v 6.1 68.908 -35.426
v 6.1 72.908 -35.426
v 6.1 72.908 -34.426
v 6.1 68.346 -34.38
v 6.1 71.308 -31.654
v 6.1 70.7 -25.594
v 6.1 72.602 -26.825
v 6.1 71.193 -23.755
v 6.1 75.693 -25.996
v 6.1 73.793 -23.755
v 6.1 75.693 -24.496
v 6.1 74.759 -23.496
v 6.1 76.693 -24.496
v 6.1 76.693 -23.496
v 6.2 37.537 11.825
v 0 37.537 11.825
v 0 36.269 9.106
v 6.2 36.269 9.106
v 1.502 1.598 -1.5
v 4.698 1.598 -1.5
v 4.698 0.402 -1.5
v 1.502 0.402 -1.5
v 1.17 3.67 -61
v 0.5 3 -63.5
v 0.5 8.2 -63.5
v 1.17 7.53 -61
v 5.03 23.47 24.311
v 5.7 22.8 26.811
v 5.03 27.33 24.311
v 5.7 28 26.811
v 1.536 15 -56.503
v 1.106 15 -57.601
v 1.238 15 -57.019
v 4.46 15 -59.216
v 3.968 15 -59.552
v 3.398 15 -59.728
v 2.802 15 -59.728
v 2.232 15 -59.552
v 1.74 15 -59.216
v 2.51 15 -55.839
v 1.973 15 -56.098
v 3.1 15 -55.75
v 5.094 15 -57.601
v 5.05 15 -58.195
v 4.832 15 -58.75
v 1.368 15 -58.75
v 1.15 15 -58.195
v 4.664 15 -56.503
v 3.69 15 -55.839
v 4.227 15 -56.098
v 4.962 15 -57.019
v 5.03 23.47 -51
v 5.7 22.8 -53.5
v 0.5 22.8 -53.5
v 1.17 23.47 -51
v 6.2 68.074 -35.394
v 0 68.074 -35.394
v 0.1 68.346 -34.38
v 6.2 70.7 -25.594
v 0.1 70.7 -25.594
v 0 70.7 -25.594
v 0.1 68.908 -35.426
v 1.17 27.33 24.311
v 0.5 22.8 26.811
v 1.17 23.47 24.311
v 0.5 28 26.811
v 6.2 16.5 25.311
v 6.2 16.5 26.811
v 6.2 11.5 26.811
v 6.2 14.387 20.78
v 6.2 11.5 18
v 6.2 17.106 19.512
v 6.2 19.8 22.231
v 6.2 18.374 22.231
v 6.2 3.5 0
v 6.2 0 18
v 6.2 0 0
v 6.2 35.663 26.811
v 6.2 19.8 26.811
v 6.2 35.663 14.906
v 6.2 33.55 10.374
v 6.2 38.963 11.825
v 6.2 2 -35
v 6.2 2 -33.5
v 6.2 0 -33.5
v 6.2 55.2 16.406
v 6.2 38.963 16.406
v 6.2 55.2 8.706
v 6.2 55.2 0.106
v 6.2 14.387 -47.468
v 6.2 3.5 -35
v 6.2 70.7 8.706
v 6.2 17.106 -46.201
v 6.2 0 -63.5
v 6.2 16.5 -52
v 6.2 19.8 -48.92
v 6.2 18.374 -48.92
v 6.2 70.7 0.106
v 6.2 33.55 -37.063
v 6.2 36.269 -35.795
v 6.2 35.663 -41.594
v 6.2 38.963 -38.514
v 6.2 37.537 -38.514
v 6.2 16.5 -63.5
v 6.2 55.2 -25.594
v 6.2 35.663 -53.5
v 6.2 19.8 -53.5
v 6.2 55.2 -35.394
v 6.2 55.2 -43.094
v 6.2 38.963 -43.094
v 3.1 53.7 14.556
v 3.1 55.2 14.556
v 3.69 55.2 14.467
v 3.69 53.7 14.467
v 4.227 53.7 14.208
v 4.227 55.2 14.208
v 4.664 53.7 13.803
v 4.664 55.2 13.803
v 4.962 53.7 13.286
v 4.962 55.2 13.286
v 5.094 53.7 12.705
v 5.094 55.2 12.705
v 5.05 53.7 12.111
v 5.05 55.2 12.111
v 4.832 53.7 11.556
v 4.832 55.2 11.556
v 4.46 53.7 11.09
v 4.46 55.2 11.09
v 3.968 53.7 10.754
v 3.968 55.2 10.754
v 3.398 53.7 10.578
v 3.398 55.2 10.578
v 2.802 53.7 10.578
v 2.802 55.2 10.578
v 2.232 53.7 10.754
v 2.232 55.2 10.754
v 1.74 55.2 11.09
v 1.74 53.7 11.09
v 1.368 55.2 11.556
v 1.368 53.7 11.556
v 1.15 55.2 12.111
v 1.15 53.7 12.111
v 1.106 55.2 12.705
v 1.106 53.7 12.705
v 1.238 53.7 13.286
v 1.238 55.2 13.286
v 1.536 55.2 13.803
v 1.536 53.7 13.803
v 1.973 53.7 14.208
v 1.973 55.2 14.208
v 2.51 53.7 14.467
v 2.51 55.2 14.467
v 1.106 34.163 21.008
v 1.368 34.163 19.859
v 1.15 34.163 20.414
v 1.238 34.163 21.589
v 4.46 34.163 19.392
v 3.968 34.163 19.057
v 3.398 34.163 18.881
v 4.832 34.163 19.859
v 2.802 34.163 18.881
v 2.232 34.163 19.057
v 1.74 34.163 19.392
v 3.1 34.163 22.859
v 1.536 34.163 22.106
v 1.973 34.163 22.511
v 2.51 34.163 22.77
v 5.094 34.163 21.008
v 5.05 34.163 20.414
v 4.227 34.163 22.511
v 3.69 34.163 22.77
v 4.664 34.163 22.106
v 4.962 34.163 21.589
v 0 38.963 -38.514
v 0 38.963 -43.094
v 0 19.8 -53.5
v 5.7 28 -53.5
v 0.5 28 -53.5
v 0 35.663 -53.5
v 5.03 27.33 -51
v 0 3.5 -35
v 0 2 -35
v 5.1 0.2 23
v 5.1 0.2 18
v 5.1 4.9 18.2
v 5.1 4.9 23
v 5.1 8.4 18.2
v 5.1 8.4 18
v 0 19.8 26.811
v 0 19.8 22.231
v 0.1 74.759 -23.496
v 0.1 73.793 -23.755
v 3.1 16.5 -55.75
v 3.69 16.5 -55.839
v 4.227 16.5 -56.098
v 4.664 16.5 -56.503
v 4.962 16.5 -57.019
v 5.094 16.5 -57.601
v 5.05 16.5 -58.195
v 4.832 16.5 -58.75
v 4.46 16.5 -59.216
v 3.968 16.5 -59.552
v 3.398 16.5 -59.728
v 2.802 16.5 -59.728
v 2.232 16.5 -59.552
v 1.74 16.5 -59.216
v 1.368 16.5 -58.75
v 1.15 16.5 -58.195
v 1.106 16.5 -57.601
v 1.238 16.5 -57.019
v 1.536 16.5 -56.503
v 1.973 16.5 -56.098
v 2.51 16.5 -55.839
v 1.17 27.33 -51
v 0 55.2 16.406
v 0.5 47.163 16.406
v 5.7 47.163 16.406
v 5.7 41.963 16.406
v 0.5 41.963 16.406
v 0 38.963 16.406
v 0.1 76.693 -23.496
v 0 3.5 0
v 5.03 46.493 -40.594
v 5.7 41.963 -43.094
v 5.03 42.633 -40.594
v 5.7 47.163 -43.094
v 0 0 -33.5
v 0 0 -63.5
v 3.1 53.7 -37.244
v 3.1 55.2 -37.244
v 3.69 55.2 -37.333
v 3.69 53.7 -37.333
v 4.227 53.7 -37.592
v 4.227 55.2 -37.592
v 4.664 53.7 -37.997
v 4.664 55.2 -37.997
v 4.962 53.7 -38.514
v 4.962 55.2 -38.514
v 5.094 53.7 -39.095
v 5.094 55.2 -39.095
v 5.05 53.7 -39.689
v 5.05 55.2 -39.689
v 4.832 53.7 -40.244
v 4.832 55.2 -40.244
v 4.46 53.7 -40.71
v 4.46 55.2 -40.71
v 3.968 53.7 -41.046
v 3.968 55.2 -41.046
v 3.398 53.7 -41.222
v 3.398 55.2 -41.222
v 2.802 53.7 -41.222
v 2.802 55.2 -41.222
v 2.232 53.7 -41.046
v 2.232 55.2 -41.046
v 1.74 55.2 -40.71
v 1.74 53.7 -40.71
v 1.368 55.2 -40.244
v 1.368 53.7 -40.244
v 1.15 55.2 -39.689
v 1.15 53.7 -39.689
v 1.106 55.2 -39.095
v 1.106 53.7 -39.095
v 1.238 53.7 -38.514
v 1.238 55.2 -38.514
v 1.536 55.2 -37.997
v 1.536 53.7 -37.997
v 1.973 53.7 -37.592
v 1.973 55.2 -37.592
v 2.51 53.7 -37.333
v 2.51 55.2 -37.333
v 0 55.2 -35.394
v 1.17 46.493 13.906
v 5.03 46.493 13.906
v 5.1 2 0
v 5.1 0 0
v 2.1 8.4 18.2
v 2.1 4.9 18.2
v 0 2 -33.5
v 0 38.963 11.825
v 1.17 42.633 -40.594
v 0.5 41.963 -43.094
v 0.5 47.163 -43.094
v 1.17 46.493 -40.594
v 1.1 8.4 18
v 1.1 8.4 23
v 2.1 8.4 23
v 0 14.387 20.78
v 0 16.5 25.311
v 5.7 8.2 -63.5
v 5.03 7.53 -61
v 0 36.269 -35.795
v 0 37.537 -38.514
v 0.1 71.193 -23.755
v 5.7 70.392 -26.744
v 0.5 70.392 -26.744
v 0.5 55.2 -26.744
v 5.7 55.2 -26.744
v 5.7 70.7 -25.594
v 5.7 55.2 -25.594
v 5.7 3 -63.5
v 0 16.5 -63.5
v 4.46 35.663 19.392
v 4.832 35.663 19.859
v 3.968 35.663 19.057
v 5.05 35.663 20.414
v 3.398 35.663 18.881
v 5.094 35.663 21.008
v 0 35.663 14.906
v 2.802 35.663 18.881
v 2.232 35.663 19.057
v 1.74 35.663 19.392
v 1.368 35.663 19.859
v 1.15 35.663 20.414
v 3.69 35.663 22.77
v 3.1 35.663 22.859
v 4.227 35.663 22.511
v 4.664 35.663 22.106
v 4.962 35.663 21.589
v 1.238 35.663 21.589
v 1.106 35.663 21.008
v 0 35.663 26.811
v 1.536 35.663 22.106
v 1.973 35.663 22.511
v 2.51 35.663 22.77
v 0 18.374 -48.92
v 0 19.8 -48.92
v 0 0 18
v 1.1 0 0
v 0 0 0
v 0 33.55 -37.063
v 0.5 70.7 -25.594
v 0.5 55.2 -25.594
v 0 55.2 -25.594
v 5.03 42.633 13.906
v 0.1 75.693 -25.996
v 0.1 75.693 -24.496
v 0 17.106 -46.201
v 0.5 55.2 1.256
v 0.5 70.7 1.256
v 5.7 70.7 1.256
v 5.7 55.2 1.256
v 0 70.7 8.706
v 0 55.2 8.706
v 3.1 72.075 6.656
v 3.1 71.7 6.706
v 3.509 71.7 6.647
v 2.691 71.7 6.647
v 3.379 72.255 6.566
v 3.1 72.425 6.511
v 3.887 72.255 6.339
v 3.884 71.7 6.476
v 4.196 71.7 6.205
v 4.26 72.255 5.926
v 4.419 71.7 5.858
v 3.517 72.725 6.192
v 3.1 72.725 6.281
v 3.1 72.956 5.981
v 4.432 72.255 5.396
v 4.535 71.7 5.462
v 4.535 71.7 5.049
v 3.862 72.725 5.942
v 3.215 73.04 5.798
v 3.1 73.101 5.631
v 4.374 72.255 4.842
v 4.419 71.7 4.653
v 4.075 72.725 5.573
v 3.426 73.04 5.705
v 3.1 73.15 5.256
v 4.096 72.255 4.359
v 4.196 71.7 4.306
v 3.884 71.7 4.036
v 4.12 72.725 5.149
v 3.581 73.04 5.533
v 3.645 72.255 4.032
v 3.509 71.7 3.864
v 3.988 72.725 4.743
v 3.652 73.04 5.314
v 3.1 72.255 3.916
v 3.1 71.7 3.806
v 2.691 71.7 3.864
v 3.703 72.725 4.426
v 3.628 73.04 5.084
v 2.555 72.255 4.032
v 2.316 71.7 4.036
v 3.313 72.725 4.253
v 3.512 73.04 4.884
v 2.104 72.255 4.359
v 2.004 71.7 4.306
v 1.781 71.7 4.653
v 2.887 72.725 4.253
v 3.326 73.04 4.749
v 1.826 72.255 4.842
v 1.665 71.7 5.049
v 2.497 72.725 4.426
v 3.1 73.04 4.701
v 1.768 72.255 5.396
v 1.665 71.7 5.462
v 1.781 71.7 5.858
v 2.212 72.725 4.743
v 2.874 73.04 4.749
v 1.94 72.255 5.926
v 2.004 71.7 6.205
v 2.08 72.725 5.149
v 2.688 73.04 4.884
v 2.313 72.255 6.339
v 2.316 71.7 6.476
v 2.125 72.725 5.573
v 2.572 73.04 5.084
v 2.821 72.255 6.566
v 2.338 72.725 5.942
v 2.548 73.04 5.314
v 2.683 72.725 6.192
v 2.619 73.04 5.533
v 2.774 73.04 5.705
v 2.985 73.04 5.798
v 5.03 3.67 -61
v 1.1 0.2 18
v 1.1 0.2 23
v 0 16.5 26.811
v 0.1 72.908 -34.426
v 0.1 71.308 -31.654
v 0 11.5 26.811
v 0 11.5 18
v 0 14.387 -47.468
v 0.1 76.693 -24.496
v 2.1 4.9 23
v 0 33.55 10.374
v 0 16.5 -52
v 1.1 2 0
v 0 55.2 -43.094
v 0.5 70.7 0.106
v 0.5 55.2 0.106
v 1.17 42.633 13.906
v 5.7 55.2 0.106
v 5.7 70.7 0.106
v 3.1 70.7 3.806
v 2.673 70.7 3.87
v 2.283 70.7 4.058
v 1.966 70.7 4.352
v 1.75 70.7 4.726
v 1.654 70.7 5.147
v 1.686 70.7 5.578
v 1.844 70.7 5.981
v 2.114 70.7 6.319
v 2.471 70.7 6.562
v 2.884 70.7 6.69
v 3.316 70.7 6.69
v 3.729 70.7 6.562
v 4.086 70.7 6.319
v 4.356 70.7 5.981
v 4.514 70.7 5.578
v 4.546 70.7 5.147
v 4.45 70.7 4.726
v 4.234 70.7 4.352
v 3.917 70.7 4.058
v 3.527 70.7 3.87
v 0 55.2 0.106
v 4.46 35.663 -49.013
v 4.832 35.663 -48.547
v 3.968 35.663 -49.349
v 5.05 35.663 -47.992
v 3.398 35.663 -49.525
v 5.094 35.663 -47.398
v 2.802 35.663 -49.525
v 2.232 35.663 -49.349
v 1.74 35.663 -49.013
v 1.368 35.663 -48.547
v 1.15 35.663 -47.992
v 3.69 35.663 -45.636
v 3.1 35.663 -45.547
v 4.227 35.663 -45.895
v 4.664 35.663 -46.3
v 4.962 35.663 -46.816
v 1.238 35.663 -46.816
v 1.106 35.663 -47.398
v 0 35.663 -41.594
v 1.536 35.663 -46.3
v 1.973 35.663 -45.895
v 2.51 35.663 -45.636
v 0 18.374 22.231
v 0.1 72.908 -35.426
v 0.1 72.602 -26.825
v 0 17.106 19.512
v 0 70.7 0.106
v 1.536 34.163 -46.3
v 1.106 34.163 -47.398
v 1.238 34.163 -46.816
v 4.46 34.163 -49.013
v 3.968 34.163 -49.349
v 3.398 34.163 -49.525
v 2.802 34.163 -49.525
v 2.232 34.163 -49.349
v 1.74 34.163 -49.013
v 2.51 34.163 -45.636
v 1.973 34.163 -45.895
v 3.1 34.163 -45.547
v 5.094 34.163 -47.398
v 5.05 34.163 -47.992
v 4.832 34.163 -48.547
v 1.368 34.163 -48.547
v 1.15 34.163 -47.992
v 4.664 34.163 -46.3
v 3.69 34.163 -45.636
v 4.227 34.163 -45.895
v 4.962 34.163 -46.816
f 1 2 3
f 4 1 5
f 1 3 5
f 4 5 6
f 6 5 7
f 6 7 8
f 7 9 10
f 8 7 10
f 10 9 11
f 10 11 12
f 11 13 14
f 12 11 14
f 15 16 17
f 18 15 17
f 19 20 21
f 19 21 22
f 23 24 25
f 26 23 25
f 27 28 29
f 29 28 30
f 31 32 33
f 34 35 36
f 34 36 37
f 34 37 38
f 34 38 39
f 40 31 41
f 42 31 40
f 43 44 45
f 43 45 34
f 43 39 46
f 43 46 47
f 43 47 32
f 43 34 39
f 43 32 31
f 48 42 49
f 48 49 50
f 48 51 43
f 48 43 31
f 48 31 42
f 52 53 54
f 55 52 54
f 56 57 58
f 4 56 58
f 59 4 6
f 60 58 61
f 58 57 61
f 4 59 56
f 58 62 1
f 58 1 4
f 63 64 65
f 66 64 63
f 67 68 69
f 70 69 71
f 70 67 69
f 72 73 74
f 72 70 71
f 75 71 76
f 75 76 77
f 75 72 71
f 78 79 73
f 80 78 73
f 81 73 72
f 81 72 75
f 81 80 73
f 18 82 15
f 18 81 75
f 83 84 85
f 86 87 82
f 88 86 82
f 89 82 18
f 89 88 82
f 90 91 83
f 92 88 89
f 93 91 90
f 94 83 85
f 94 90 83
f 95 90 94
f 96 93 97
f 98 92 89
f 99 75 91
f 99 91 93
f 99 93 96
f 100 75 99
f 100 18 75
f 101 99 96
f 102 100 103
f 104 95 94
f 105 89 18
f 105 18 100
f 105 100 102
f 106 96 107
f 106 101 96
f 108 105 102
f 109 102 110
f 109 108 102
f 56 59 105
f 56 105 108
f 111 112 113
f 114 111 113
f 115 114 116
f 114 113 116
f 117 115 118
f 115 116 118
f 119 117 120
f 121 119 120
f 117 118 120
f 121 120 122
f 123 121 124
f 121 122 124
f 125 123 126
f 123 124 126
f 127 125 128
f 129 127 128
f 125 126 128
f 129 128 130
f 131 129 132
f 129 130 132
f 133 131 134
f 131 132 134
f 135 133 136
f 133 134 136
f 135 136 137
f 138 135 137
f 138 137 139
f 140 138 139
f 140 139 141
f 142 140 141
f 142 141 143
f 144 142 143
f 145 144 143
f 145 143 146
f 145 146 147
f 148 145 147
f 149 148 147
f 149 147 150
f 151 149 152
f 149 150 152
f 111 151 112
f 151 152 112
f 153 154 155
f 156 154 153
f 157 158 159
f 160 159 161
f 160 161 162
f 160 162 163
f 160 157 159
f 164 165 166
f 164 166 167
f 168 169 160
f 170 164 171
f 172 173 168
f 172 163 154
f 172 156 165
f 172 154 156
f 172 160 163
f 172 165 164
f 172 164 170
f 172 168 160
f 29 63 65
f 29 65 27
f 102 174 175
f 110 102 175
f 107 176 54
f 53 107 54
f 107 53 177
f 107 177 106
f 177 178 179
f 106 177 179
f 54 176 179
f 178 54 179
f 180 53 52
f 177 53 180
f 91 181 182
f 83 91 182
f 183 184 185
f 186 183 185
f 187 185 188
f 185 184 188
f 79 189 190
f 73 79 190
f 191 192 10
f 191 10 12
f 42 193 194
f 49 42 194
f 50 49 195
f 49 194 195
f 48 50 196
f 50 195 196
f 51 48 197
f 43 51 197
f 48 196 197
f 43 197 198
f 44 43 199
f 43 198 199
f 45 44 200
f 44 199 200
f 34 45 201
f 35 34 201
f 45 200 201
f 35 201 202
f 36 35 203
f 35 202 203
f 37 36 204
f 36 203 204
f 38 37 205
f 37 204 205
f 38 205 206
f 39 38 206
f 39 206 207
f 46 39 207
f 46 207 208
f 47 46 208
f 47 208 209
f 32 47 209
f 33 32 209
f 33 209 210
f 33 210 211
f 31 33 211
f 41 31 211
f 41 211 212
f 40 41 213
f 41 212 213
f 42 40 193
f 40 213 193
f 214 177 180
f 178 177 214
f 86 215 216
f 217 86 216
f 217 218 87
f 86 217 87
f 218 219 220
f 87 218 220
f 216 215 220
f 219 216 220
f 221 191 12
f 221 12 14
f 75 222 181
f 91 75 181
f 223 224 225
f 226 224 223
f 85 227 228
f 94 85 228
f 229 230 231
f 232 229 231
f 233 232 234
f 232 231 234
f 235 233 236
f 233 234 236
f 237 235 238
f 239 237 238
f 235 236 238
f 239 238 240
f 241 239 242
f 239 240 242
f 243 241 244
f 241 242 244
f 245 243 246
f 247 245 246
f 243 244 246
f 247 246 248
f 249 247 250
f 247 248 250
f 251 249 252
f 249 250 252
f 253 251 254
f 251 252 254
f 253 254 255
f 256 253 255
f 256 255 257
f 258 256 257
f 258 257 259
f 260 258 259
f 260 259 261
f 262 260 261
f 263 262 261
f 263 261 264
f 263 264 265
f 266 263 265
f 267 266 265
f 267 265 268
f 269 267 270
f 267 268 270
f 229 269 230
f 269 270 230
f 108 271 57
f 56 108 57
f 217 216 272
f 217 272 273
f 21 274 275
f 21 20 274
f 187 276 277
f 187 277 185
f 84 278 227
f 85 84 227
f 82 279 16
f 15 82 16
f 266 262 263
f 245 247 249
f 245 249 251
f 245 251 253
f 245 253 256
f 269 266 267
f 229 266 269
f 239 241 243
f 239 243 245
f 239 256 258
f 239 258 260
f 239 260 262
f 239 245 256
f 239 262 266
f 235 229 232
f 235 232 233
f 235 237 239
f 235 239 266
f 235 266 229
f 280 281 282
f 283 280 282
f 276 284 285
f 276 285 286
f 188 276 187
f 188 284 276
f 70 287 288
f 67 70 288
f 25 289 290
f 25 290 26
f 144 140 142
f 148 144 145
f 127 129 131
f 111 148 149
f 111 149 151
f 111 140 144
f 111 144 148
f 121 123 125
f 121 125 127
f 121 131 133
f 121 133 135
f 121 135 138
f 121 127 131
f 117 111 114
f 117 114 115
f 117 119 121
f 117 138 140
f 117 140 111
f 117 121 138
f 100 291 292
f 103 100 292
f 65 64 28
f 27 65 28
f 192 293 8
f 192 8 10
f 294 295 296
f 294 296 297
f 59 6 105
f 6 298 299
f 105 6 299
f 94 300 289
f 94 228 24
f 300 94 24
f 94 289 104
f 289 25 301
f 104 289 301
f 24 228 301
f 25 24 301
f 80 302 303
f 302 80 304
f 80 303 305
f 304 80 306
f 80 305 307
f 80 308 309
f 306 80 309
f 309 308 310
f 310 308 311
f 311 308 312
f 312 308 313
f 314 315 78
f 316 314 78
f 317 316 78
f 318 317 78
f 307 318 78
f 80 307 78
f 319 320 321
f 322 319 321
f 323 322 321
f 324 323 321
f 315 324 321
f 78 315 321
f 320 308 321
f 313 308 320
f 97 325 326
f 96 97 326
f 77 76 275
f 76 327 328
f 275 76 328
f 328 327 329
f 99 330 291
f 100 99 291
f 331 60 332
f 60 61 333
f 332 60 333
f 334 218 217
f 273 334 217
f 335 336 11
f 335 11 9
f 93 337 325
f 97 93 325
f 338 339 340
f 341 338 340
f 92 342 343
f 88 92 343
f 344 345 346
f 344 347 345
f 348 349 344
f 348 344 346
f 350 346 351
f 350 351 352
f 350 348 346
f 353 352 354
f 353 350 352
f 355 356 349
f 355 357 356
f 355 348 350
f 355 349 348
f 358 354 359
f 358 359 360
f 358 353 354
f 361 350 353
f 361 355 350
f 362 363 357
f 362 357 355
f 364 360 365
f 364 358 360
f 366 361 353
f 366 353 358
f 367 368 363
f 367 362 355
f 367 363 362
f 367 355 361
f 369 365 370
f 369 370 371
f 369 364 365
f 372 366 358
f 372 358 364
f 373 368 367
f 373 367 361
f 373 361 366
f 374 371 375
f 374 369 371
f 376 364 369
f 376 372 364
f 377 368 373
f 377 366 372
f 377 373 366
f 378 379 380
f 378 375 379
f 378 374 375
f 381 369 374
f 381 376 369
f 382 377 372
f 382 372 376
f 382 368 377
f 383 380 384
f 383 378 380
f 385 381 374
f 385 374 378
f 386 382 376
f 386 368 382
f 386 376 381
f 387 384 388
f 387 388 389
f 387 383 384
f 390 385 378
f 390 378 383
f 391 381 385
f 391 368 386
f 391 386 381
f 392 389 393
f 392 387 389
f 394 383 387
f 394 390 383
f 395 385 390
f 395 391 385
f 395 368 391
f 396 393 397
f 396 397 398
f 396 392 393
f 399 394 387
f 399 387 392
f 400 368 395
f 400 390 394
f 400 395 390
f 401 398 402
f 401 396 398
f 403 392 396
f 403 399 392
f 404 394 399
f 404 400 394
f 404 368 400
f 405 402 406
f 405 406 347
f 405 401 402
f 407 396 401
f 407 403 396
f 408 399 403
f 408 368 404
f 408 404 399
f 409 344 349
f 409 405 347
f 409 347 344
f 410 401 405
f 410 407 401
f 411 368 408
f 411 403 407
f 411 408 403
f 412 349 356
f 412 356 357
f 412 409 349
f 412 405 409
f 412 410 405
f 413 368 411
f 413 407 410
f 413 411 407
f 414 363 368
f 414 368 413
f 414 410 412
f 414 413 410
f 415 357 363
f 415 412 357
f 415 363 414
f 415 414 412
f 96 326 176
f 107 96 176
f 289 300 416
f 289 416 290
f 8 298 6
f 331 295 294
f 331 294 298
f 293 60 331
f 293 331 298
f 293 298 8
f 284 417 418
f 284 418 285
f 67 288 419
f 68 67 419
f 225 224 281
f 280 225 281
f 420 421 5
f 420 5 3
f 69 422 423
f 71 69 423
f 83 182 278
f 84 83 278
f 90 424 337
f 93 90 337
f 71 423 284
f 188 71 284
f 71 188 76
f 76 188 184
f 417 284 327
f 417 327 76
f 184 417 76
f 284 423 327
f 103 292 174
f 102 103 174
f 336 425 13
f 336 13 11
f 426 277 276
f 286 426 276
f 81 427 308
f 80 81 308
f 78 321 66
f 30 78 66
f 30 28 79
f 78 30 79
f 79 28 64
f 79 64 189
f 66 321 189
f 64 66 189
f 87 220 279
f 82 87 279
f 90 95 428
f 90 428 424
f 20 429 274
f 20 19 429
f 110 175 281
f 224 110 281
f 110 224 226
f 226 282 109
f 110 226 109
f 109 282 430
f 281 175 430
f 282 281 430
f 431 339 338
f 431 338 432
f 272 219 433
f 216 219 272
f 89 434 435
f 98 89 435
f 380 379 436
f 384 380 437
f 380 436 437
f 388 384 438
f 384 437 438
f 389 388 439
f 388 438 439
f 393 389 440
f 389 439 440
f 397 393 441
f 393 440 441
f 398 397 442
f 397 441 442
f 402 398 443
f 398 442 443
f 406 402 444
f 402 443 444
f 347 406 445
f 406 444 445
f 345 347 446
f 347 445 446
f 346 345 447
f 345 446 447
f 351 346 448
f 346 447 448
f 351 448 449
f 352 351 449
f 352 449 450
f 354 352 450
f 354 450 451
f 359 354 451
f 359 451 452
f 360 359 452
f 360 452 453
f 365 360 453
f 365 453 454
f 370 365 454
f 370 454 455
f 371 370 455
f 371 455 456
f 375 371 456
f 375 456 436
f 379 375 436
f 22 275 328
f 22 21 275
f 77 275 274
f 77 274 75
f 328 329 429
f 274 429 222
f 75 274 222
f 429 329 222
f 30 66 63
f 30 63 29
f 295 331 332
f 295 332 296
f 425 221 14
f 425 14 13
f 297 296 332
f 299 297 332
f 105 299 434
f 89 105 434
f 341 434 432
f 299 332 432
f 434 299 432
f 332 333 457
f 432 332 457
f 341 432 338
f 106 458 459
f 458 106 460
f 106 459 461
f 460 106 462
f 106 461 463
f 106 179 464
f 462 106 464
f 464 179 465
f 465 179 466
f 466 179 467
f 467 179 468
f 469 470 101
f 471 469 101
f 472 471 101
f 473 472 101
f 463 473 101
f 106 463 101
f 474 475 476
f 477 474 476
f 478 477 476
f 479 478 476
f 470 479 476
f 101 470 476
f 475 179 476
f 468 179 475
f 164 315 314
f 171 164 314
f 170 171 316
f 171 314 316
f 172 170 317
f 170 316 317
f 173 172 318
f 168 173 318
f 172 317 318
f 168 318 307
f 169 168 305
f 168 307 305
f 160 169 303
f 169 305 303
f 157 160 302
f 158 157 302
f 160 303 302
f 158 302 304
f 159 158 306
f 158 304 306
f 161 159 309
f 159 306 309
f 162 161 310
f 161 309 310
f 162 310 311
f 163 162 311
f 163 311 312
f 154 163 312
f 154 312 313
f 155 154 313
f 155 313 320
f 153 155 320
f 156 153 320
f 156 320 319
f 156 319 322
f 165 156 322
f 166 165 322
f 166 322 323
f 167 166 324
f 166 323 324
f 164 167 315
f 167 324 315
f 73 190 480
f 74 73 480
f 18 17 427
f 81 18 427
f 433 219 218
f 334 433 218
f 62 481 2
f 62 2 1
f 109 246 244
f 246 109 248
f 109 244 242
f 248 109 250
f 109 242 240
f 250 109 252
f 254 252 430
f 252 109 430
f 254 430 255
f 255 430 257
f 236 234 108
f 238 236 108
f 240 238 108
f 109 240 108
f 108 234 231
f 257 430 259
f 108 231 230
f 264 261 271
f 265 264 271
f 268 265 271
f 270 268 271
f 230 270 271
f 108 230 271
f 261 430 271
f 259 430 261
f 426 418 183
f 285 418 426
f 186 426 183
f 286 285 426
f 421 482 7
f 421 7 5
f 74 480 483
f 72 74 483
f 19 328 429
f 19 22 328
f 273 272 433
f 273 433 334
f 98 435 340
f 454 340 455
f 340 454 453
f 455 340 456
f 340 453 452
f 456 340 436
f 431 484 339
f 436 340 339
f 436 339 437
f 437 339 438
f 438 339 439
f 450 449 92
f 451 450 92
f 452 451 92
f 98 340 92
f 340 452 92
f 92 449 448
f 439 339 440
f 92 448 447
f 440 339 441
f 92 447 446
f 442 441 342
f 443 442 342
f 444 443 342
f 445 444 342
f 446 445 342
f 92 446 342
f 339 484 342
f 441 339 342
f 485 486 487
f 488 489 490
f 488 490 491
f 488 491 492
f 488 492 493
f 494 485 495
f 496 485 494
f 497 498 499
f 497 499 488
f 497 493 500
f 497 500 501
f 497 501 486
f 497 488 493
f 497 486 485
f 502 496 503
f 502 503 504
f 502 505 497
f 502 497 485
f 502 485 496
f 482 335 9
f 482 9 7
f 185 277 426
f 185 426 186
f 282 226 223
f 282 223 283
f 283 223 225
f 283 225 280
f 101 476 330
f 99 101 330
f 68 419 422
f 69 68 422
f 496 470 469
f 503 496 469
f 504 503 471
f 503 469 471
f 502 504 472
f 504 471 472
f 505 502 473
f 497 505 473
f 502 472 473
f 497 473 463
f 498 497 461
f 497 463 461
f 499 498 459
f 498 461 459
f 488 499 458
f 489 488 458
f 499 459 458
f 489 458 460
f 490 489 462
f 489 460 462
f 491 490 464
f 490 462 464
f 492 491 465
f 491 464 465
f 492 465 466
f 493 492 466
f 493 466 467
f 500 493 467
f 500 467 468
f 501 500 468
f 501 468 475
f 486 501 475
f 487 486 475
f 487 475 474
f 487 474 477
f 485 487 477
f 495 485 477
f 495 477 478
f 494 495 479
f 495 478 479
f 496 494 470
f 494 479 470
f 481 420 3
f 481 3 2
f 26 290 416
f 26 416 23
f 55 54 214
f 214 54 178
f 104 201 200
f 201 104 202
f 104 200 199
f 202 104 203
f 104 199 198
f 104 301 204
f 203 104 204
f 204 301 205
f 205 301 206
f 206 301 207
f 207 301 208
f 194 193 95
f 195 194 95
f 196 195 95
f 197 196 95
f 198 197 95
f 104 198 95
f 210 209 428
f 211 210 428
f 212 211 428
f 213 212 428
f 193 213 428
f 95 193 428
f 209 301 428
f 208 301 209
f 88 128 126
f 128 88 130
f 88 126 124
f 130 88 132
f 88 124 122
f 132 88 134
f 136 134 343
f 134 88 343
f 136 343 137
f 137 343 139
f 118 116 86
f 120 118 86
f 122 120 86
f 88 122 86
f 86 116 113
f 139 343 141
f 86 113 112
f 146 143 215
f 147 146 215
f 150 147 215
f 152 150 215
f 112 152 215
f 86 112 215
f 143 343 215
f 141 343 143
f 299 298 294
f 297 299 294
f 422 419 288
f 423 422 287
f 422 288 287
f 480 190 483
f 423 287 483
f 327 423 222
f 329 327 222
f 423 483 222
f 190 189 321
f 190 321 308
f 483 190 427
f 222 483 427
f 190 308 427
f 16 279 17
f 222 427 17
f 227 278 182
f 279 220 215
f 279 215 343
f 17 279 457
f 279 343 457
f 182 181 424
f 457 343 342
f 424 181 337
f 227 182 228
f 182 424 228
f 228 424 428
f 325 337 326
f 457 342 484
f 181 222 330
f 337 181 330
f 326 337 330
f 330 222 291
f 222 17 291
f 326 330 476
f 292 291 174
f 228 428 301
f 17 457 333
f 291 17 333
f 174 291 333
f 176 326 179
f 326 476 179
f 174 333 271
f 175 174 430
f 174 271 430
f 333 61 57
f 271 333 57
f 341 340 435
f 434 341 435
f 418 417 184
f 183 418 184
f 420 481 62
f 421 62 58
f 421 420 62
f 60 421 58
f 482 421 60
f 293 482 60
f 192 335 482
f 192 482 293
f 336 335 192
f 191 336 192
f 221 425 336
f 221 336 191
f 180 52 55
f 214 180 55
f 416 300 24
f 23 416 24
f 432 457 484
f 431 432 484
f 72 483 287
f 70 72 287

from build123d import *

# Parameters (mm, degrees)
BOSS_EXTRUDE1_DEPTH      = 6.2
SKETCH2_W                = 5.2
SKETCH2_H                = 28
CUT_EXTRUDE1_DEPTH       = 15.5
SKETCH3_R                = 1.45
BOSS_EXTRUDE2_DEPTH      = 1
DOME1_FACE_RADIUS        = 1.45
DOME1_HEIGHT             = 1.45
SKETCH4_W                = 4
SKETCH4_H                = 8.2
BOSS_EXTRUDE3_DEPTH      = 5
SKETCH5_W                = 3
SKETCH5_H                = 3.5
CUT_EXTRUDE2_DEPTH       = 4.8
SKETCH6_W                = 4
SKETCH6_H                = 2
BOSS_EXTRUDE4_DEPTH      = 1.5
BOSS_EXTRUDE4_TAPER      = 15
BOSS_EXTRUDE5_DEPTH      = 3
BOSS_EXTRUDE5_DEPTH_BACK = 3
SKETCH8_R                = 2
CUT_EXTRUDE3_DEPTH       = 1.5
SKETCH9_R                = 2
CUT_EXTRUDE4_DEPTH       = 1.5
SKETCH10_R               = 2
CUT_EXTRUDE5_DEPTH       = 1.5
SKETCH11_W               = 5.2
SKETCH11_H               = 5.2
CUT_EXTRUDE6_DEPTH       = 2.5
CUT_EXTRUDE6_DRAFT       = -15
SKETCH12_W               = 5.2
SKETCH12_H               = 5.2
CUT_EXTRUDE7_DEPTH       = 2.5
CUT_EXTRUDE7_DRAFT       = -15
SKETCH13_W               = 5.2
SKETCH13_H               = 5.2
CUT_EXTRUDE8_DEPTH       = 2.5
CUT_EXTRUDE8_DRAFT       = -15
SKETCH14_W               = 5.2
SKETCH14_H               = 5.2
CUT_EXTRUDE9_DEPTH       = 2.5
CUT_EXTRUDE9_DRAFT       = -15
SKETCH15_W               = 5.2
SKETCH15_H               = 5.2
CUT_EXTRUDE10_DEPTH      = 2.5
CUT_EXTRUDE10_DRAFT      = -15


with BuildPart() as part:
    # Sketch1 → Boss-Extrude1 (new body)
    with BuildSketch(Plane(origin=(0, 0, 0), x_dir=(0, 0, -1), z_dir=(1, 0, 0))):
        Polygon((0, 0), (0, 3.5), (35, 3.5), (35, 2), (33.5, 2), (33.5, 0), (63.5, 0), (63.5, 16.5), (52, 16.5), (47.468461065, 14.386908691), (46.20060628, 17.105832052), (48.919529641, 18.373686838), (48.919529641, 19.8), (53.5, 19.8), (53.5, 35.663086876), (41.594285018, 35.663086876), (37.062746083, 33.549995567), (35.794891298, 36.268918928), (38.513814659, 37.536773714), (38.513814659, 38.963086876), (43.094285018, 38.963086876), (43.094285018, 55.2), (35.394285018, 55.2), (35.394285018, 68.074097914), (25.594285018, 70.7), (25.594285018, 55.2), (-0.105714982, 55.2), (-0.105714982, 70.7), (-8.705714982, 70.7), (-8.705714982, 55.2), (-16.405714982, 55.2), (-16.405714982, 38.963086876), (-11.825244622, 38.963086876), (-11.825244622, 37.536773714), (-9.106321261, 36.268918928), (-10.374176047, 33.549995567), (-14.905714982, 35.663086876), (-26.811429963, 35.663086876), (-26.811429963, 19.8), (-22.230959604, 19.8), (-22.230959604, 18.373686838), (-19.512036243, 17.105832052), (-20.779891028, 14.386908691), (-25.311429963, 16.5), (-26.811429963, 16.5), (-26.811429963, 11.5), (-18, 11.5), (-18, 0), align=None)
    extrude(amount=BOSS_EXTRUDE1_DEPTH)

    # Sketch2 → Cut-Extrude1 (cut)
    with BuildSketch(Plane(origin=(0, 70.7, 0), x_dir=(1, 0, 0), z_dir=(0, 1, 0))):
        with Locations((3.1, 12.744285018)):
            Rectangle(SKETCH2_W, SKETCH2_H)
    extrude(amount=-CUT_EXTRUDE1_DEPTH, mode=Mode.SUBTRACT)

    # Sketch3 → Boss-Extrude2 (add)
    with BuildSketch(Plane(origin=(0, 70.7, 0), x_dir=(1, 0, 0), z_dir=(0, 1, 0))):
        with Locations(Location((3.1, -5.255714982, 0), (0, 0, 90))):
            Circle(SKETCH3_R)
    extrude(amount=BOSS_EXTRUDE2_DEPTH)

    # Dome1: a dome of height H over a round flat face of radius A is a cap of a sphere of radius (A * A + H * H) / (2 * H)
    dome1_r = (DOME1_FACE_RADIUS * DOME1_FACE_RADIUS + DOME1_HEIGHT * DOME1_HEIGHT) / (2 * DOME1_HEIGHT)
    dome1_base = Plane((3.1, 71.7, 5.255714982), z_dir=(0, 1, 0))
    with Locations(dome1_base.offset(DOME1_HEIGHT - dome1_r)):
        dome1_ball = Sphere(dome1_r, mode=Mode.PRIVATE)
    add(split(dome1_ball, bisect_by=dome1_base, keep=Keep.TOP, mode=Mode.PRIVATE))

    # Sketch4 → Boss-Extrude3 (add)
    with BuildSketch(Plane.XY.offset(18)):
        with Locations((3.1, 4.3)):
            Rectangle(SKETCH4_W, SKETCH4_H)
    extrude(amount=BOSS_EXTRUDE3_DEPTH)

    # Sketch5 → Cut-Extrude2 (cut)
    with BuildSketch(Plane.XY.offset(23)):
        with Locations((3.6, 6.65)):
            Rectangle(SKETCH5_W, SKETCH5_H)
    extrude(amount=-CUT_EXTRUDE2_DEPTH, mode=Mode.SUBTRACT)

    # Sketch6 → Boss-Extrude4 (add)
    with BuildSketch(Plane(origin=(0, 0, 0), x_dir=(-1, 0, 0), z_dir=(0, 0, -1))):
        with Locations((-3.1, 1)):
            Rectangle(SKETCH6_W, SKETCH6_H)
    extrude(amount=BOSS_EXTRUDE4_DEPTH, taper=BOSS_EXTRUDE4_TAPER)

    # Sketch7 → Boss-Extrude5 (add, two sides: drawn at the far end of the back side and taken through both)
    with BuildSketch(Plane(origin=(3.1, 0, 0), x_dir=(0, 0, -1), z_dir=(1, 0, 0)).offset(-BOSS_EXTRUDE5_DEPTH_BACK)):
        Polygon((34.380497445, 68.345741476), (23.755313356, 71.192750972), (23.755313356, 73.792750972), (23.496494311, 74.758676798), (23.496494311, 76.692750972), (24.496494311, 76.692750972), (24.496494311, 75.692750972), (25.996494311, 75.692750972), (26.824715255, 72.601788328), (31.654344387, 71.307693102), (34.425625679, 72.907693102), (35.425625679, 72.907693102), (35.425625679, 68.907693102), align=None)
    extrude(amount=BOSS_EXTRUDE5_DEPTH + BOSS_EXTRUDE5_DEPTH_BACK)

    # Sketch8 → Cut-Extrude3 (cut)
    with BuildSketch(Plane(origin=(0, 55.2, 0), x_dir=(1, 0, 0), z_dir=(0, 1, 0))):
        with Locations(Location((3.1, 39.244285018, 0), (0, 0, 270))):
            Circle(SKETCH8_R)
        with Locations(Location((3.1, -12.555714982, 0), (0, 0, 270))):
            Circle(SKETCH8_R)
    extrude(amount=-CUT_EXTRUDE3_DEPTH, mode=Mode.SUBTRACT)

    # Sketch9 → Cut-Extrude4 (cut)
    with BuildSketch(Plane(origin=(0, 35.663086876, 0), x_dir=(1, 0, 0), z_dir=(0, 1, 0))):
        with Locations(Location((3.1, 47.547142509, 0), (0, 0, 270))):
            Circle(SKETCH9_R)
        with Locations(Location((3.1, -20.858572473, 0), (0, 0, 270))):
            Circle(SKETCH9_R)
    extrude(amount=-CUT_EXTRUDE4_DEPTH, mode=Mode.SUBTRACT)

    # Sketch10 → Cut-Extrude5 (cut)
    with BuildSketch(Plane(origin=(0, 16.5, 0), x_dir=(1, 0, 0), z_dir=(0, 1, 0))):
        with Locations(Location((3.1, 57.75, 0), (0, 0, 270))):
            Circle(SKETCH10_R)
    extrude(amount=-CUT_EXTRUDE5_DEPTH, mode=Mode.SUBTRACT)


with BuildPart() as cut_extrude6_tool:
    # Sketch11 → Cut-Extrude6 (with draft: the straight prism first)
    with BuildSketch(Plane(origin=(0, 0, -63.5), x_dir=(-1, 0, 0), z_dir=(0, 0, -1))):
        with Locations((-3.1, 5.6)):
            Rectangle(SKETCH11_W, SKETCH11_H)
    extrude(amount=-CUT_EXTRUDE6_DEPTH)
    # Cut-Extrude6: the draft: its side faces are tilted about the plane it starts from
    cut_extrude6_sides = [cut_extrude6_tool.faces().sort_by_distance(p)[0] for p in [
        (3.1, 3, -62.25),
        (0.5, 5.6, -62.25),
        (3.1, 8.2, -62.25),
        (5.7, 5.6, -62.25),
    ]]
    draft(cut_extrude6_sides, Plane(origin=(0, 0, -63.5), x_dir=(-1, 0, 0), z_dir=(0, 0, -1)), CUT_EXTRUDE6_DRAFT)


with BuildPart() as part_1:
    add(part.part)

    # Cut-Extrude6: cut by cut_extrude6_tool
    add(cut_extrude6_tool.part, mode=Mode.SUBTRACT)


with BuildPart() as cut_extrude7_tool:
    # Sketch12 → Cut-Extrude7 (with draft: the straight prism first)
    with BuildSketch(Plane(origin=(0, 0, -53.5), x_dir=(-1, 0, 0), z_dir=(0, 0, -1))):
        with Locations((-3.1, 25.4)):
            Rectangle(SKETCH12_W, SKETCH12_H)
    extrude(amount=-CUT_EXTRUDE7_DEPTH)
    # Cut-Extrude7: the draft: its side faces are tilted about the plane it starts from
    cut_extrude7_sides = [cut_extrude7_tool.faces().sort_by_distance(p)[0] for p in [
        (3.1, 22.8, -52.25),
        (0.5, 25.4, -52.25),
        (3.1, 28, -52.25),
        (5.7, 25.4, -52.25),
    ]]
    draft(cut_extrude7_sides, Plane(origin=(0, 0, -53.5), x_dir=(-1, 0, 0), z_dir=(0, 0, -1)), CUT_EXTRUDE7_DRAFT)


with BuildPart() as part_2:
    add(part_1.part)

    # Cut-Extrude7: cut by cut_extrude7_tool
    add(cut_extrude7_tool.part, mode=Mode.SUBTRACT)


with BuildPart() as cut_extrude8_tool:
    # Sketch13 → Cut-Extrude8 (with draft: the straight prism first)
    with BuildSketch(Plane(origin=(0, 0, -43.094285018), x_dir=(-1, 0, 0), z_dir=(0, 0, -1))):
        with Locations((-3.1, 44.563086876)):
            Rectangle(SKETCH13_W, SKETCH13_H)
    extrude(amount=-CUT_EXTRUDE8_DEPTH)
    # Cut-Extrude8: the draft: its side faces are tilted about the plane it starts from
    cut_extrude8_sides = [cut_extrude8_tool.faces().sort_by_distance(p)[0] for p in [
        (3.1, 41.963086876, -41.844285018),
        (0.5, 44.563086876, -41.844285018),
        (3.1, 47.163086876, -41.844285018),
        (5.7, 44.563086876, -41.844285018),
    ]]
    draft(cut_extrude8_sides, Plane(origin=(0, 0, -43.094285018), x_dir=(-1, 0, 0), z_dir=(0, 0, -1)), CUT_EXTRUDE8_DRAFT)


with BuildPart() as part_3:
    add(part_2.part)

    # Cut-Extrude8: cut by cut_extrude8_tool
    add(cut_extrude8_tool.part, mode=Mode.SUBTRACT)


with BuildPart() as cut_extrude9_tool:
    # Sketch14 → Cut-Extrude9 (with draft: the straight prism first)
    with BuildSketch(Plane.XY.offset(26.811429963)):
        with Locations((3.1, 25.4)):
            Rectangle(SKETCH14_W, SKETCH14_H)
    extrude(amount=-CUT_EXTRUDE9_DEPTH)
    # Cut-Extrude9: the draft: its side faces are tilted about the plane it starts from
    cut_extrude9_sides = [cut_extrude9_tool.faces().sort_by_distance(p)[0] for p in [
        (3.1, 22.8, 25.561429963),
        (5.7, 25.4, 25.561429963),
        (3.1, 28, 25.561429963),
        (0.5, 25.4, 25.561429963),
    ]]
    draft(cut_extrude9_sides, Plane.XY.offset(26.811429963), CUT_EXTRUDE9_DRAFT)


with BuildPart() as part_4:
    add(part_3.part)

    # Cut-Extrude9: cut by cut_extrude9_tool
    add(cut_extrude9_tool.part, mode=Mode.SUBTRACT)


with BuildPart() as cut_extrude10_tool:
    # Sketch15 → Cut-Extrude10 (with draft: the straight prism first)
    with BuildSketch(Plane.XY.offset(16.405714982)):
        with Locations((3.1, 44.563086876)):
            Rectangle(SKETCH15_W, SKETCH15_H)
    extrude(amount=-CUT_EXTRUDE10_DEPTH)
    # Cut-Extrude10: the draft: its side faces are tilted about the plane it starts from
    cut_extrude10_sides = [cut_extrude10_tool.faces().sort_by_distance(p)[0] for p in [
        (3.1, 41.963086876, 15.155714982),
        (5.7, 44.563086876, 15.155714982),
        (3.1, 47.163086876, 15.155714982),
        (0.5, 44.563086876, 15.155714982),
    ]]
    draft(cut_extrude10_sides, Plane.XY.offset(16.405714982), CUT_EXTRUDE10_DRAFT)


with BuildPart() as part_5:
    add(part_4.part)

    # Cut-Extrude10: cut by cut_extrude10_tool
    add(cut_extrude10_tool.part, mode=Mode.SUBTRACT)


solid = part_5.part
